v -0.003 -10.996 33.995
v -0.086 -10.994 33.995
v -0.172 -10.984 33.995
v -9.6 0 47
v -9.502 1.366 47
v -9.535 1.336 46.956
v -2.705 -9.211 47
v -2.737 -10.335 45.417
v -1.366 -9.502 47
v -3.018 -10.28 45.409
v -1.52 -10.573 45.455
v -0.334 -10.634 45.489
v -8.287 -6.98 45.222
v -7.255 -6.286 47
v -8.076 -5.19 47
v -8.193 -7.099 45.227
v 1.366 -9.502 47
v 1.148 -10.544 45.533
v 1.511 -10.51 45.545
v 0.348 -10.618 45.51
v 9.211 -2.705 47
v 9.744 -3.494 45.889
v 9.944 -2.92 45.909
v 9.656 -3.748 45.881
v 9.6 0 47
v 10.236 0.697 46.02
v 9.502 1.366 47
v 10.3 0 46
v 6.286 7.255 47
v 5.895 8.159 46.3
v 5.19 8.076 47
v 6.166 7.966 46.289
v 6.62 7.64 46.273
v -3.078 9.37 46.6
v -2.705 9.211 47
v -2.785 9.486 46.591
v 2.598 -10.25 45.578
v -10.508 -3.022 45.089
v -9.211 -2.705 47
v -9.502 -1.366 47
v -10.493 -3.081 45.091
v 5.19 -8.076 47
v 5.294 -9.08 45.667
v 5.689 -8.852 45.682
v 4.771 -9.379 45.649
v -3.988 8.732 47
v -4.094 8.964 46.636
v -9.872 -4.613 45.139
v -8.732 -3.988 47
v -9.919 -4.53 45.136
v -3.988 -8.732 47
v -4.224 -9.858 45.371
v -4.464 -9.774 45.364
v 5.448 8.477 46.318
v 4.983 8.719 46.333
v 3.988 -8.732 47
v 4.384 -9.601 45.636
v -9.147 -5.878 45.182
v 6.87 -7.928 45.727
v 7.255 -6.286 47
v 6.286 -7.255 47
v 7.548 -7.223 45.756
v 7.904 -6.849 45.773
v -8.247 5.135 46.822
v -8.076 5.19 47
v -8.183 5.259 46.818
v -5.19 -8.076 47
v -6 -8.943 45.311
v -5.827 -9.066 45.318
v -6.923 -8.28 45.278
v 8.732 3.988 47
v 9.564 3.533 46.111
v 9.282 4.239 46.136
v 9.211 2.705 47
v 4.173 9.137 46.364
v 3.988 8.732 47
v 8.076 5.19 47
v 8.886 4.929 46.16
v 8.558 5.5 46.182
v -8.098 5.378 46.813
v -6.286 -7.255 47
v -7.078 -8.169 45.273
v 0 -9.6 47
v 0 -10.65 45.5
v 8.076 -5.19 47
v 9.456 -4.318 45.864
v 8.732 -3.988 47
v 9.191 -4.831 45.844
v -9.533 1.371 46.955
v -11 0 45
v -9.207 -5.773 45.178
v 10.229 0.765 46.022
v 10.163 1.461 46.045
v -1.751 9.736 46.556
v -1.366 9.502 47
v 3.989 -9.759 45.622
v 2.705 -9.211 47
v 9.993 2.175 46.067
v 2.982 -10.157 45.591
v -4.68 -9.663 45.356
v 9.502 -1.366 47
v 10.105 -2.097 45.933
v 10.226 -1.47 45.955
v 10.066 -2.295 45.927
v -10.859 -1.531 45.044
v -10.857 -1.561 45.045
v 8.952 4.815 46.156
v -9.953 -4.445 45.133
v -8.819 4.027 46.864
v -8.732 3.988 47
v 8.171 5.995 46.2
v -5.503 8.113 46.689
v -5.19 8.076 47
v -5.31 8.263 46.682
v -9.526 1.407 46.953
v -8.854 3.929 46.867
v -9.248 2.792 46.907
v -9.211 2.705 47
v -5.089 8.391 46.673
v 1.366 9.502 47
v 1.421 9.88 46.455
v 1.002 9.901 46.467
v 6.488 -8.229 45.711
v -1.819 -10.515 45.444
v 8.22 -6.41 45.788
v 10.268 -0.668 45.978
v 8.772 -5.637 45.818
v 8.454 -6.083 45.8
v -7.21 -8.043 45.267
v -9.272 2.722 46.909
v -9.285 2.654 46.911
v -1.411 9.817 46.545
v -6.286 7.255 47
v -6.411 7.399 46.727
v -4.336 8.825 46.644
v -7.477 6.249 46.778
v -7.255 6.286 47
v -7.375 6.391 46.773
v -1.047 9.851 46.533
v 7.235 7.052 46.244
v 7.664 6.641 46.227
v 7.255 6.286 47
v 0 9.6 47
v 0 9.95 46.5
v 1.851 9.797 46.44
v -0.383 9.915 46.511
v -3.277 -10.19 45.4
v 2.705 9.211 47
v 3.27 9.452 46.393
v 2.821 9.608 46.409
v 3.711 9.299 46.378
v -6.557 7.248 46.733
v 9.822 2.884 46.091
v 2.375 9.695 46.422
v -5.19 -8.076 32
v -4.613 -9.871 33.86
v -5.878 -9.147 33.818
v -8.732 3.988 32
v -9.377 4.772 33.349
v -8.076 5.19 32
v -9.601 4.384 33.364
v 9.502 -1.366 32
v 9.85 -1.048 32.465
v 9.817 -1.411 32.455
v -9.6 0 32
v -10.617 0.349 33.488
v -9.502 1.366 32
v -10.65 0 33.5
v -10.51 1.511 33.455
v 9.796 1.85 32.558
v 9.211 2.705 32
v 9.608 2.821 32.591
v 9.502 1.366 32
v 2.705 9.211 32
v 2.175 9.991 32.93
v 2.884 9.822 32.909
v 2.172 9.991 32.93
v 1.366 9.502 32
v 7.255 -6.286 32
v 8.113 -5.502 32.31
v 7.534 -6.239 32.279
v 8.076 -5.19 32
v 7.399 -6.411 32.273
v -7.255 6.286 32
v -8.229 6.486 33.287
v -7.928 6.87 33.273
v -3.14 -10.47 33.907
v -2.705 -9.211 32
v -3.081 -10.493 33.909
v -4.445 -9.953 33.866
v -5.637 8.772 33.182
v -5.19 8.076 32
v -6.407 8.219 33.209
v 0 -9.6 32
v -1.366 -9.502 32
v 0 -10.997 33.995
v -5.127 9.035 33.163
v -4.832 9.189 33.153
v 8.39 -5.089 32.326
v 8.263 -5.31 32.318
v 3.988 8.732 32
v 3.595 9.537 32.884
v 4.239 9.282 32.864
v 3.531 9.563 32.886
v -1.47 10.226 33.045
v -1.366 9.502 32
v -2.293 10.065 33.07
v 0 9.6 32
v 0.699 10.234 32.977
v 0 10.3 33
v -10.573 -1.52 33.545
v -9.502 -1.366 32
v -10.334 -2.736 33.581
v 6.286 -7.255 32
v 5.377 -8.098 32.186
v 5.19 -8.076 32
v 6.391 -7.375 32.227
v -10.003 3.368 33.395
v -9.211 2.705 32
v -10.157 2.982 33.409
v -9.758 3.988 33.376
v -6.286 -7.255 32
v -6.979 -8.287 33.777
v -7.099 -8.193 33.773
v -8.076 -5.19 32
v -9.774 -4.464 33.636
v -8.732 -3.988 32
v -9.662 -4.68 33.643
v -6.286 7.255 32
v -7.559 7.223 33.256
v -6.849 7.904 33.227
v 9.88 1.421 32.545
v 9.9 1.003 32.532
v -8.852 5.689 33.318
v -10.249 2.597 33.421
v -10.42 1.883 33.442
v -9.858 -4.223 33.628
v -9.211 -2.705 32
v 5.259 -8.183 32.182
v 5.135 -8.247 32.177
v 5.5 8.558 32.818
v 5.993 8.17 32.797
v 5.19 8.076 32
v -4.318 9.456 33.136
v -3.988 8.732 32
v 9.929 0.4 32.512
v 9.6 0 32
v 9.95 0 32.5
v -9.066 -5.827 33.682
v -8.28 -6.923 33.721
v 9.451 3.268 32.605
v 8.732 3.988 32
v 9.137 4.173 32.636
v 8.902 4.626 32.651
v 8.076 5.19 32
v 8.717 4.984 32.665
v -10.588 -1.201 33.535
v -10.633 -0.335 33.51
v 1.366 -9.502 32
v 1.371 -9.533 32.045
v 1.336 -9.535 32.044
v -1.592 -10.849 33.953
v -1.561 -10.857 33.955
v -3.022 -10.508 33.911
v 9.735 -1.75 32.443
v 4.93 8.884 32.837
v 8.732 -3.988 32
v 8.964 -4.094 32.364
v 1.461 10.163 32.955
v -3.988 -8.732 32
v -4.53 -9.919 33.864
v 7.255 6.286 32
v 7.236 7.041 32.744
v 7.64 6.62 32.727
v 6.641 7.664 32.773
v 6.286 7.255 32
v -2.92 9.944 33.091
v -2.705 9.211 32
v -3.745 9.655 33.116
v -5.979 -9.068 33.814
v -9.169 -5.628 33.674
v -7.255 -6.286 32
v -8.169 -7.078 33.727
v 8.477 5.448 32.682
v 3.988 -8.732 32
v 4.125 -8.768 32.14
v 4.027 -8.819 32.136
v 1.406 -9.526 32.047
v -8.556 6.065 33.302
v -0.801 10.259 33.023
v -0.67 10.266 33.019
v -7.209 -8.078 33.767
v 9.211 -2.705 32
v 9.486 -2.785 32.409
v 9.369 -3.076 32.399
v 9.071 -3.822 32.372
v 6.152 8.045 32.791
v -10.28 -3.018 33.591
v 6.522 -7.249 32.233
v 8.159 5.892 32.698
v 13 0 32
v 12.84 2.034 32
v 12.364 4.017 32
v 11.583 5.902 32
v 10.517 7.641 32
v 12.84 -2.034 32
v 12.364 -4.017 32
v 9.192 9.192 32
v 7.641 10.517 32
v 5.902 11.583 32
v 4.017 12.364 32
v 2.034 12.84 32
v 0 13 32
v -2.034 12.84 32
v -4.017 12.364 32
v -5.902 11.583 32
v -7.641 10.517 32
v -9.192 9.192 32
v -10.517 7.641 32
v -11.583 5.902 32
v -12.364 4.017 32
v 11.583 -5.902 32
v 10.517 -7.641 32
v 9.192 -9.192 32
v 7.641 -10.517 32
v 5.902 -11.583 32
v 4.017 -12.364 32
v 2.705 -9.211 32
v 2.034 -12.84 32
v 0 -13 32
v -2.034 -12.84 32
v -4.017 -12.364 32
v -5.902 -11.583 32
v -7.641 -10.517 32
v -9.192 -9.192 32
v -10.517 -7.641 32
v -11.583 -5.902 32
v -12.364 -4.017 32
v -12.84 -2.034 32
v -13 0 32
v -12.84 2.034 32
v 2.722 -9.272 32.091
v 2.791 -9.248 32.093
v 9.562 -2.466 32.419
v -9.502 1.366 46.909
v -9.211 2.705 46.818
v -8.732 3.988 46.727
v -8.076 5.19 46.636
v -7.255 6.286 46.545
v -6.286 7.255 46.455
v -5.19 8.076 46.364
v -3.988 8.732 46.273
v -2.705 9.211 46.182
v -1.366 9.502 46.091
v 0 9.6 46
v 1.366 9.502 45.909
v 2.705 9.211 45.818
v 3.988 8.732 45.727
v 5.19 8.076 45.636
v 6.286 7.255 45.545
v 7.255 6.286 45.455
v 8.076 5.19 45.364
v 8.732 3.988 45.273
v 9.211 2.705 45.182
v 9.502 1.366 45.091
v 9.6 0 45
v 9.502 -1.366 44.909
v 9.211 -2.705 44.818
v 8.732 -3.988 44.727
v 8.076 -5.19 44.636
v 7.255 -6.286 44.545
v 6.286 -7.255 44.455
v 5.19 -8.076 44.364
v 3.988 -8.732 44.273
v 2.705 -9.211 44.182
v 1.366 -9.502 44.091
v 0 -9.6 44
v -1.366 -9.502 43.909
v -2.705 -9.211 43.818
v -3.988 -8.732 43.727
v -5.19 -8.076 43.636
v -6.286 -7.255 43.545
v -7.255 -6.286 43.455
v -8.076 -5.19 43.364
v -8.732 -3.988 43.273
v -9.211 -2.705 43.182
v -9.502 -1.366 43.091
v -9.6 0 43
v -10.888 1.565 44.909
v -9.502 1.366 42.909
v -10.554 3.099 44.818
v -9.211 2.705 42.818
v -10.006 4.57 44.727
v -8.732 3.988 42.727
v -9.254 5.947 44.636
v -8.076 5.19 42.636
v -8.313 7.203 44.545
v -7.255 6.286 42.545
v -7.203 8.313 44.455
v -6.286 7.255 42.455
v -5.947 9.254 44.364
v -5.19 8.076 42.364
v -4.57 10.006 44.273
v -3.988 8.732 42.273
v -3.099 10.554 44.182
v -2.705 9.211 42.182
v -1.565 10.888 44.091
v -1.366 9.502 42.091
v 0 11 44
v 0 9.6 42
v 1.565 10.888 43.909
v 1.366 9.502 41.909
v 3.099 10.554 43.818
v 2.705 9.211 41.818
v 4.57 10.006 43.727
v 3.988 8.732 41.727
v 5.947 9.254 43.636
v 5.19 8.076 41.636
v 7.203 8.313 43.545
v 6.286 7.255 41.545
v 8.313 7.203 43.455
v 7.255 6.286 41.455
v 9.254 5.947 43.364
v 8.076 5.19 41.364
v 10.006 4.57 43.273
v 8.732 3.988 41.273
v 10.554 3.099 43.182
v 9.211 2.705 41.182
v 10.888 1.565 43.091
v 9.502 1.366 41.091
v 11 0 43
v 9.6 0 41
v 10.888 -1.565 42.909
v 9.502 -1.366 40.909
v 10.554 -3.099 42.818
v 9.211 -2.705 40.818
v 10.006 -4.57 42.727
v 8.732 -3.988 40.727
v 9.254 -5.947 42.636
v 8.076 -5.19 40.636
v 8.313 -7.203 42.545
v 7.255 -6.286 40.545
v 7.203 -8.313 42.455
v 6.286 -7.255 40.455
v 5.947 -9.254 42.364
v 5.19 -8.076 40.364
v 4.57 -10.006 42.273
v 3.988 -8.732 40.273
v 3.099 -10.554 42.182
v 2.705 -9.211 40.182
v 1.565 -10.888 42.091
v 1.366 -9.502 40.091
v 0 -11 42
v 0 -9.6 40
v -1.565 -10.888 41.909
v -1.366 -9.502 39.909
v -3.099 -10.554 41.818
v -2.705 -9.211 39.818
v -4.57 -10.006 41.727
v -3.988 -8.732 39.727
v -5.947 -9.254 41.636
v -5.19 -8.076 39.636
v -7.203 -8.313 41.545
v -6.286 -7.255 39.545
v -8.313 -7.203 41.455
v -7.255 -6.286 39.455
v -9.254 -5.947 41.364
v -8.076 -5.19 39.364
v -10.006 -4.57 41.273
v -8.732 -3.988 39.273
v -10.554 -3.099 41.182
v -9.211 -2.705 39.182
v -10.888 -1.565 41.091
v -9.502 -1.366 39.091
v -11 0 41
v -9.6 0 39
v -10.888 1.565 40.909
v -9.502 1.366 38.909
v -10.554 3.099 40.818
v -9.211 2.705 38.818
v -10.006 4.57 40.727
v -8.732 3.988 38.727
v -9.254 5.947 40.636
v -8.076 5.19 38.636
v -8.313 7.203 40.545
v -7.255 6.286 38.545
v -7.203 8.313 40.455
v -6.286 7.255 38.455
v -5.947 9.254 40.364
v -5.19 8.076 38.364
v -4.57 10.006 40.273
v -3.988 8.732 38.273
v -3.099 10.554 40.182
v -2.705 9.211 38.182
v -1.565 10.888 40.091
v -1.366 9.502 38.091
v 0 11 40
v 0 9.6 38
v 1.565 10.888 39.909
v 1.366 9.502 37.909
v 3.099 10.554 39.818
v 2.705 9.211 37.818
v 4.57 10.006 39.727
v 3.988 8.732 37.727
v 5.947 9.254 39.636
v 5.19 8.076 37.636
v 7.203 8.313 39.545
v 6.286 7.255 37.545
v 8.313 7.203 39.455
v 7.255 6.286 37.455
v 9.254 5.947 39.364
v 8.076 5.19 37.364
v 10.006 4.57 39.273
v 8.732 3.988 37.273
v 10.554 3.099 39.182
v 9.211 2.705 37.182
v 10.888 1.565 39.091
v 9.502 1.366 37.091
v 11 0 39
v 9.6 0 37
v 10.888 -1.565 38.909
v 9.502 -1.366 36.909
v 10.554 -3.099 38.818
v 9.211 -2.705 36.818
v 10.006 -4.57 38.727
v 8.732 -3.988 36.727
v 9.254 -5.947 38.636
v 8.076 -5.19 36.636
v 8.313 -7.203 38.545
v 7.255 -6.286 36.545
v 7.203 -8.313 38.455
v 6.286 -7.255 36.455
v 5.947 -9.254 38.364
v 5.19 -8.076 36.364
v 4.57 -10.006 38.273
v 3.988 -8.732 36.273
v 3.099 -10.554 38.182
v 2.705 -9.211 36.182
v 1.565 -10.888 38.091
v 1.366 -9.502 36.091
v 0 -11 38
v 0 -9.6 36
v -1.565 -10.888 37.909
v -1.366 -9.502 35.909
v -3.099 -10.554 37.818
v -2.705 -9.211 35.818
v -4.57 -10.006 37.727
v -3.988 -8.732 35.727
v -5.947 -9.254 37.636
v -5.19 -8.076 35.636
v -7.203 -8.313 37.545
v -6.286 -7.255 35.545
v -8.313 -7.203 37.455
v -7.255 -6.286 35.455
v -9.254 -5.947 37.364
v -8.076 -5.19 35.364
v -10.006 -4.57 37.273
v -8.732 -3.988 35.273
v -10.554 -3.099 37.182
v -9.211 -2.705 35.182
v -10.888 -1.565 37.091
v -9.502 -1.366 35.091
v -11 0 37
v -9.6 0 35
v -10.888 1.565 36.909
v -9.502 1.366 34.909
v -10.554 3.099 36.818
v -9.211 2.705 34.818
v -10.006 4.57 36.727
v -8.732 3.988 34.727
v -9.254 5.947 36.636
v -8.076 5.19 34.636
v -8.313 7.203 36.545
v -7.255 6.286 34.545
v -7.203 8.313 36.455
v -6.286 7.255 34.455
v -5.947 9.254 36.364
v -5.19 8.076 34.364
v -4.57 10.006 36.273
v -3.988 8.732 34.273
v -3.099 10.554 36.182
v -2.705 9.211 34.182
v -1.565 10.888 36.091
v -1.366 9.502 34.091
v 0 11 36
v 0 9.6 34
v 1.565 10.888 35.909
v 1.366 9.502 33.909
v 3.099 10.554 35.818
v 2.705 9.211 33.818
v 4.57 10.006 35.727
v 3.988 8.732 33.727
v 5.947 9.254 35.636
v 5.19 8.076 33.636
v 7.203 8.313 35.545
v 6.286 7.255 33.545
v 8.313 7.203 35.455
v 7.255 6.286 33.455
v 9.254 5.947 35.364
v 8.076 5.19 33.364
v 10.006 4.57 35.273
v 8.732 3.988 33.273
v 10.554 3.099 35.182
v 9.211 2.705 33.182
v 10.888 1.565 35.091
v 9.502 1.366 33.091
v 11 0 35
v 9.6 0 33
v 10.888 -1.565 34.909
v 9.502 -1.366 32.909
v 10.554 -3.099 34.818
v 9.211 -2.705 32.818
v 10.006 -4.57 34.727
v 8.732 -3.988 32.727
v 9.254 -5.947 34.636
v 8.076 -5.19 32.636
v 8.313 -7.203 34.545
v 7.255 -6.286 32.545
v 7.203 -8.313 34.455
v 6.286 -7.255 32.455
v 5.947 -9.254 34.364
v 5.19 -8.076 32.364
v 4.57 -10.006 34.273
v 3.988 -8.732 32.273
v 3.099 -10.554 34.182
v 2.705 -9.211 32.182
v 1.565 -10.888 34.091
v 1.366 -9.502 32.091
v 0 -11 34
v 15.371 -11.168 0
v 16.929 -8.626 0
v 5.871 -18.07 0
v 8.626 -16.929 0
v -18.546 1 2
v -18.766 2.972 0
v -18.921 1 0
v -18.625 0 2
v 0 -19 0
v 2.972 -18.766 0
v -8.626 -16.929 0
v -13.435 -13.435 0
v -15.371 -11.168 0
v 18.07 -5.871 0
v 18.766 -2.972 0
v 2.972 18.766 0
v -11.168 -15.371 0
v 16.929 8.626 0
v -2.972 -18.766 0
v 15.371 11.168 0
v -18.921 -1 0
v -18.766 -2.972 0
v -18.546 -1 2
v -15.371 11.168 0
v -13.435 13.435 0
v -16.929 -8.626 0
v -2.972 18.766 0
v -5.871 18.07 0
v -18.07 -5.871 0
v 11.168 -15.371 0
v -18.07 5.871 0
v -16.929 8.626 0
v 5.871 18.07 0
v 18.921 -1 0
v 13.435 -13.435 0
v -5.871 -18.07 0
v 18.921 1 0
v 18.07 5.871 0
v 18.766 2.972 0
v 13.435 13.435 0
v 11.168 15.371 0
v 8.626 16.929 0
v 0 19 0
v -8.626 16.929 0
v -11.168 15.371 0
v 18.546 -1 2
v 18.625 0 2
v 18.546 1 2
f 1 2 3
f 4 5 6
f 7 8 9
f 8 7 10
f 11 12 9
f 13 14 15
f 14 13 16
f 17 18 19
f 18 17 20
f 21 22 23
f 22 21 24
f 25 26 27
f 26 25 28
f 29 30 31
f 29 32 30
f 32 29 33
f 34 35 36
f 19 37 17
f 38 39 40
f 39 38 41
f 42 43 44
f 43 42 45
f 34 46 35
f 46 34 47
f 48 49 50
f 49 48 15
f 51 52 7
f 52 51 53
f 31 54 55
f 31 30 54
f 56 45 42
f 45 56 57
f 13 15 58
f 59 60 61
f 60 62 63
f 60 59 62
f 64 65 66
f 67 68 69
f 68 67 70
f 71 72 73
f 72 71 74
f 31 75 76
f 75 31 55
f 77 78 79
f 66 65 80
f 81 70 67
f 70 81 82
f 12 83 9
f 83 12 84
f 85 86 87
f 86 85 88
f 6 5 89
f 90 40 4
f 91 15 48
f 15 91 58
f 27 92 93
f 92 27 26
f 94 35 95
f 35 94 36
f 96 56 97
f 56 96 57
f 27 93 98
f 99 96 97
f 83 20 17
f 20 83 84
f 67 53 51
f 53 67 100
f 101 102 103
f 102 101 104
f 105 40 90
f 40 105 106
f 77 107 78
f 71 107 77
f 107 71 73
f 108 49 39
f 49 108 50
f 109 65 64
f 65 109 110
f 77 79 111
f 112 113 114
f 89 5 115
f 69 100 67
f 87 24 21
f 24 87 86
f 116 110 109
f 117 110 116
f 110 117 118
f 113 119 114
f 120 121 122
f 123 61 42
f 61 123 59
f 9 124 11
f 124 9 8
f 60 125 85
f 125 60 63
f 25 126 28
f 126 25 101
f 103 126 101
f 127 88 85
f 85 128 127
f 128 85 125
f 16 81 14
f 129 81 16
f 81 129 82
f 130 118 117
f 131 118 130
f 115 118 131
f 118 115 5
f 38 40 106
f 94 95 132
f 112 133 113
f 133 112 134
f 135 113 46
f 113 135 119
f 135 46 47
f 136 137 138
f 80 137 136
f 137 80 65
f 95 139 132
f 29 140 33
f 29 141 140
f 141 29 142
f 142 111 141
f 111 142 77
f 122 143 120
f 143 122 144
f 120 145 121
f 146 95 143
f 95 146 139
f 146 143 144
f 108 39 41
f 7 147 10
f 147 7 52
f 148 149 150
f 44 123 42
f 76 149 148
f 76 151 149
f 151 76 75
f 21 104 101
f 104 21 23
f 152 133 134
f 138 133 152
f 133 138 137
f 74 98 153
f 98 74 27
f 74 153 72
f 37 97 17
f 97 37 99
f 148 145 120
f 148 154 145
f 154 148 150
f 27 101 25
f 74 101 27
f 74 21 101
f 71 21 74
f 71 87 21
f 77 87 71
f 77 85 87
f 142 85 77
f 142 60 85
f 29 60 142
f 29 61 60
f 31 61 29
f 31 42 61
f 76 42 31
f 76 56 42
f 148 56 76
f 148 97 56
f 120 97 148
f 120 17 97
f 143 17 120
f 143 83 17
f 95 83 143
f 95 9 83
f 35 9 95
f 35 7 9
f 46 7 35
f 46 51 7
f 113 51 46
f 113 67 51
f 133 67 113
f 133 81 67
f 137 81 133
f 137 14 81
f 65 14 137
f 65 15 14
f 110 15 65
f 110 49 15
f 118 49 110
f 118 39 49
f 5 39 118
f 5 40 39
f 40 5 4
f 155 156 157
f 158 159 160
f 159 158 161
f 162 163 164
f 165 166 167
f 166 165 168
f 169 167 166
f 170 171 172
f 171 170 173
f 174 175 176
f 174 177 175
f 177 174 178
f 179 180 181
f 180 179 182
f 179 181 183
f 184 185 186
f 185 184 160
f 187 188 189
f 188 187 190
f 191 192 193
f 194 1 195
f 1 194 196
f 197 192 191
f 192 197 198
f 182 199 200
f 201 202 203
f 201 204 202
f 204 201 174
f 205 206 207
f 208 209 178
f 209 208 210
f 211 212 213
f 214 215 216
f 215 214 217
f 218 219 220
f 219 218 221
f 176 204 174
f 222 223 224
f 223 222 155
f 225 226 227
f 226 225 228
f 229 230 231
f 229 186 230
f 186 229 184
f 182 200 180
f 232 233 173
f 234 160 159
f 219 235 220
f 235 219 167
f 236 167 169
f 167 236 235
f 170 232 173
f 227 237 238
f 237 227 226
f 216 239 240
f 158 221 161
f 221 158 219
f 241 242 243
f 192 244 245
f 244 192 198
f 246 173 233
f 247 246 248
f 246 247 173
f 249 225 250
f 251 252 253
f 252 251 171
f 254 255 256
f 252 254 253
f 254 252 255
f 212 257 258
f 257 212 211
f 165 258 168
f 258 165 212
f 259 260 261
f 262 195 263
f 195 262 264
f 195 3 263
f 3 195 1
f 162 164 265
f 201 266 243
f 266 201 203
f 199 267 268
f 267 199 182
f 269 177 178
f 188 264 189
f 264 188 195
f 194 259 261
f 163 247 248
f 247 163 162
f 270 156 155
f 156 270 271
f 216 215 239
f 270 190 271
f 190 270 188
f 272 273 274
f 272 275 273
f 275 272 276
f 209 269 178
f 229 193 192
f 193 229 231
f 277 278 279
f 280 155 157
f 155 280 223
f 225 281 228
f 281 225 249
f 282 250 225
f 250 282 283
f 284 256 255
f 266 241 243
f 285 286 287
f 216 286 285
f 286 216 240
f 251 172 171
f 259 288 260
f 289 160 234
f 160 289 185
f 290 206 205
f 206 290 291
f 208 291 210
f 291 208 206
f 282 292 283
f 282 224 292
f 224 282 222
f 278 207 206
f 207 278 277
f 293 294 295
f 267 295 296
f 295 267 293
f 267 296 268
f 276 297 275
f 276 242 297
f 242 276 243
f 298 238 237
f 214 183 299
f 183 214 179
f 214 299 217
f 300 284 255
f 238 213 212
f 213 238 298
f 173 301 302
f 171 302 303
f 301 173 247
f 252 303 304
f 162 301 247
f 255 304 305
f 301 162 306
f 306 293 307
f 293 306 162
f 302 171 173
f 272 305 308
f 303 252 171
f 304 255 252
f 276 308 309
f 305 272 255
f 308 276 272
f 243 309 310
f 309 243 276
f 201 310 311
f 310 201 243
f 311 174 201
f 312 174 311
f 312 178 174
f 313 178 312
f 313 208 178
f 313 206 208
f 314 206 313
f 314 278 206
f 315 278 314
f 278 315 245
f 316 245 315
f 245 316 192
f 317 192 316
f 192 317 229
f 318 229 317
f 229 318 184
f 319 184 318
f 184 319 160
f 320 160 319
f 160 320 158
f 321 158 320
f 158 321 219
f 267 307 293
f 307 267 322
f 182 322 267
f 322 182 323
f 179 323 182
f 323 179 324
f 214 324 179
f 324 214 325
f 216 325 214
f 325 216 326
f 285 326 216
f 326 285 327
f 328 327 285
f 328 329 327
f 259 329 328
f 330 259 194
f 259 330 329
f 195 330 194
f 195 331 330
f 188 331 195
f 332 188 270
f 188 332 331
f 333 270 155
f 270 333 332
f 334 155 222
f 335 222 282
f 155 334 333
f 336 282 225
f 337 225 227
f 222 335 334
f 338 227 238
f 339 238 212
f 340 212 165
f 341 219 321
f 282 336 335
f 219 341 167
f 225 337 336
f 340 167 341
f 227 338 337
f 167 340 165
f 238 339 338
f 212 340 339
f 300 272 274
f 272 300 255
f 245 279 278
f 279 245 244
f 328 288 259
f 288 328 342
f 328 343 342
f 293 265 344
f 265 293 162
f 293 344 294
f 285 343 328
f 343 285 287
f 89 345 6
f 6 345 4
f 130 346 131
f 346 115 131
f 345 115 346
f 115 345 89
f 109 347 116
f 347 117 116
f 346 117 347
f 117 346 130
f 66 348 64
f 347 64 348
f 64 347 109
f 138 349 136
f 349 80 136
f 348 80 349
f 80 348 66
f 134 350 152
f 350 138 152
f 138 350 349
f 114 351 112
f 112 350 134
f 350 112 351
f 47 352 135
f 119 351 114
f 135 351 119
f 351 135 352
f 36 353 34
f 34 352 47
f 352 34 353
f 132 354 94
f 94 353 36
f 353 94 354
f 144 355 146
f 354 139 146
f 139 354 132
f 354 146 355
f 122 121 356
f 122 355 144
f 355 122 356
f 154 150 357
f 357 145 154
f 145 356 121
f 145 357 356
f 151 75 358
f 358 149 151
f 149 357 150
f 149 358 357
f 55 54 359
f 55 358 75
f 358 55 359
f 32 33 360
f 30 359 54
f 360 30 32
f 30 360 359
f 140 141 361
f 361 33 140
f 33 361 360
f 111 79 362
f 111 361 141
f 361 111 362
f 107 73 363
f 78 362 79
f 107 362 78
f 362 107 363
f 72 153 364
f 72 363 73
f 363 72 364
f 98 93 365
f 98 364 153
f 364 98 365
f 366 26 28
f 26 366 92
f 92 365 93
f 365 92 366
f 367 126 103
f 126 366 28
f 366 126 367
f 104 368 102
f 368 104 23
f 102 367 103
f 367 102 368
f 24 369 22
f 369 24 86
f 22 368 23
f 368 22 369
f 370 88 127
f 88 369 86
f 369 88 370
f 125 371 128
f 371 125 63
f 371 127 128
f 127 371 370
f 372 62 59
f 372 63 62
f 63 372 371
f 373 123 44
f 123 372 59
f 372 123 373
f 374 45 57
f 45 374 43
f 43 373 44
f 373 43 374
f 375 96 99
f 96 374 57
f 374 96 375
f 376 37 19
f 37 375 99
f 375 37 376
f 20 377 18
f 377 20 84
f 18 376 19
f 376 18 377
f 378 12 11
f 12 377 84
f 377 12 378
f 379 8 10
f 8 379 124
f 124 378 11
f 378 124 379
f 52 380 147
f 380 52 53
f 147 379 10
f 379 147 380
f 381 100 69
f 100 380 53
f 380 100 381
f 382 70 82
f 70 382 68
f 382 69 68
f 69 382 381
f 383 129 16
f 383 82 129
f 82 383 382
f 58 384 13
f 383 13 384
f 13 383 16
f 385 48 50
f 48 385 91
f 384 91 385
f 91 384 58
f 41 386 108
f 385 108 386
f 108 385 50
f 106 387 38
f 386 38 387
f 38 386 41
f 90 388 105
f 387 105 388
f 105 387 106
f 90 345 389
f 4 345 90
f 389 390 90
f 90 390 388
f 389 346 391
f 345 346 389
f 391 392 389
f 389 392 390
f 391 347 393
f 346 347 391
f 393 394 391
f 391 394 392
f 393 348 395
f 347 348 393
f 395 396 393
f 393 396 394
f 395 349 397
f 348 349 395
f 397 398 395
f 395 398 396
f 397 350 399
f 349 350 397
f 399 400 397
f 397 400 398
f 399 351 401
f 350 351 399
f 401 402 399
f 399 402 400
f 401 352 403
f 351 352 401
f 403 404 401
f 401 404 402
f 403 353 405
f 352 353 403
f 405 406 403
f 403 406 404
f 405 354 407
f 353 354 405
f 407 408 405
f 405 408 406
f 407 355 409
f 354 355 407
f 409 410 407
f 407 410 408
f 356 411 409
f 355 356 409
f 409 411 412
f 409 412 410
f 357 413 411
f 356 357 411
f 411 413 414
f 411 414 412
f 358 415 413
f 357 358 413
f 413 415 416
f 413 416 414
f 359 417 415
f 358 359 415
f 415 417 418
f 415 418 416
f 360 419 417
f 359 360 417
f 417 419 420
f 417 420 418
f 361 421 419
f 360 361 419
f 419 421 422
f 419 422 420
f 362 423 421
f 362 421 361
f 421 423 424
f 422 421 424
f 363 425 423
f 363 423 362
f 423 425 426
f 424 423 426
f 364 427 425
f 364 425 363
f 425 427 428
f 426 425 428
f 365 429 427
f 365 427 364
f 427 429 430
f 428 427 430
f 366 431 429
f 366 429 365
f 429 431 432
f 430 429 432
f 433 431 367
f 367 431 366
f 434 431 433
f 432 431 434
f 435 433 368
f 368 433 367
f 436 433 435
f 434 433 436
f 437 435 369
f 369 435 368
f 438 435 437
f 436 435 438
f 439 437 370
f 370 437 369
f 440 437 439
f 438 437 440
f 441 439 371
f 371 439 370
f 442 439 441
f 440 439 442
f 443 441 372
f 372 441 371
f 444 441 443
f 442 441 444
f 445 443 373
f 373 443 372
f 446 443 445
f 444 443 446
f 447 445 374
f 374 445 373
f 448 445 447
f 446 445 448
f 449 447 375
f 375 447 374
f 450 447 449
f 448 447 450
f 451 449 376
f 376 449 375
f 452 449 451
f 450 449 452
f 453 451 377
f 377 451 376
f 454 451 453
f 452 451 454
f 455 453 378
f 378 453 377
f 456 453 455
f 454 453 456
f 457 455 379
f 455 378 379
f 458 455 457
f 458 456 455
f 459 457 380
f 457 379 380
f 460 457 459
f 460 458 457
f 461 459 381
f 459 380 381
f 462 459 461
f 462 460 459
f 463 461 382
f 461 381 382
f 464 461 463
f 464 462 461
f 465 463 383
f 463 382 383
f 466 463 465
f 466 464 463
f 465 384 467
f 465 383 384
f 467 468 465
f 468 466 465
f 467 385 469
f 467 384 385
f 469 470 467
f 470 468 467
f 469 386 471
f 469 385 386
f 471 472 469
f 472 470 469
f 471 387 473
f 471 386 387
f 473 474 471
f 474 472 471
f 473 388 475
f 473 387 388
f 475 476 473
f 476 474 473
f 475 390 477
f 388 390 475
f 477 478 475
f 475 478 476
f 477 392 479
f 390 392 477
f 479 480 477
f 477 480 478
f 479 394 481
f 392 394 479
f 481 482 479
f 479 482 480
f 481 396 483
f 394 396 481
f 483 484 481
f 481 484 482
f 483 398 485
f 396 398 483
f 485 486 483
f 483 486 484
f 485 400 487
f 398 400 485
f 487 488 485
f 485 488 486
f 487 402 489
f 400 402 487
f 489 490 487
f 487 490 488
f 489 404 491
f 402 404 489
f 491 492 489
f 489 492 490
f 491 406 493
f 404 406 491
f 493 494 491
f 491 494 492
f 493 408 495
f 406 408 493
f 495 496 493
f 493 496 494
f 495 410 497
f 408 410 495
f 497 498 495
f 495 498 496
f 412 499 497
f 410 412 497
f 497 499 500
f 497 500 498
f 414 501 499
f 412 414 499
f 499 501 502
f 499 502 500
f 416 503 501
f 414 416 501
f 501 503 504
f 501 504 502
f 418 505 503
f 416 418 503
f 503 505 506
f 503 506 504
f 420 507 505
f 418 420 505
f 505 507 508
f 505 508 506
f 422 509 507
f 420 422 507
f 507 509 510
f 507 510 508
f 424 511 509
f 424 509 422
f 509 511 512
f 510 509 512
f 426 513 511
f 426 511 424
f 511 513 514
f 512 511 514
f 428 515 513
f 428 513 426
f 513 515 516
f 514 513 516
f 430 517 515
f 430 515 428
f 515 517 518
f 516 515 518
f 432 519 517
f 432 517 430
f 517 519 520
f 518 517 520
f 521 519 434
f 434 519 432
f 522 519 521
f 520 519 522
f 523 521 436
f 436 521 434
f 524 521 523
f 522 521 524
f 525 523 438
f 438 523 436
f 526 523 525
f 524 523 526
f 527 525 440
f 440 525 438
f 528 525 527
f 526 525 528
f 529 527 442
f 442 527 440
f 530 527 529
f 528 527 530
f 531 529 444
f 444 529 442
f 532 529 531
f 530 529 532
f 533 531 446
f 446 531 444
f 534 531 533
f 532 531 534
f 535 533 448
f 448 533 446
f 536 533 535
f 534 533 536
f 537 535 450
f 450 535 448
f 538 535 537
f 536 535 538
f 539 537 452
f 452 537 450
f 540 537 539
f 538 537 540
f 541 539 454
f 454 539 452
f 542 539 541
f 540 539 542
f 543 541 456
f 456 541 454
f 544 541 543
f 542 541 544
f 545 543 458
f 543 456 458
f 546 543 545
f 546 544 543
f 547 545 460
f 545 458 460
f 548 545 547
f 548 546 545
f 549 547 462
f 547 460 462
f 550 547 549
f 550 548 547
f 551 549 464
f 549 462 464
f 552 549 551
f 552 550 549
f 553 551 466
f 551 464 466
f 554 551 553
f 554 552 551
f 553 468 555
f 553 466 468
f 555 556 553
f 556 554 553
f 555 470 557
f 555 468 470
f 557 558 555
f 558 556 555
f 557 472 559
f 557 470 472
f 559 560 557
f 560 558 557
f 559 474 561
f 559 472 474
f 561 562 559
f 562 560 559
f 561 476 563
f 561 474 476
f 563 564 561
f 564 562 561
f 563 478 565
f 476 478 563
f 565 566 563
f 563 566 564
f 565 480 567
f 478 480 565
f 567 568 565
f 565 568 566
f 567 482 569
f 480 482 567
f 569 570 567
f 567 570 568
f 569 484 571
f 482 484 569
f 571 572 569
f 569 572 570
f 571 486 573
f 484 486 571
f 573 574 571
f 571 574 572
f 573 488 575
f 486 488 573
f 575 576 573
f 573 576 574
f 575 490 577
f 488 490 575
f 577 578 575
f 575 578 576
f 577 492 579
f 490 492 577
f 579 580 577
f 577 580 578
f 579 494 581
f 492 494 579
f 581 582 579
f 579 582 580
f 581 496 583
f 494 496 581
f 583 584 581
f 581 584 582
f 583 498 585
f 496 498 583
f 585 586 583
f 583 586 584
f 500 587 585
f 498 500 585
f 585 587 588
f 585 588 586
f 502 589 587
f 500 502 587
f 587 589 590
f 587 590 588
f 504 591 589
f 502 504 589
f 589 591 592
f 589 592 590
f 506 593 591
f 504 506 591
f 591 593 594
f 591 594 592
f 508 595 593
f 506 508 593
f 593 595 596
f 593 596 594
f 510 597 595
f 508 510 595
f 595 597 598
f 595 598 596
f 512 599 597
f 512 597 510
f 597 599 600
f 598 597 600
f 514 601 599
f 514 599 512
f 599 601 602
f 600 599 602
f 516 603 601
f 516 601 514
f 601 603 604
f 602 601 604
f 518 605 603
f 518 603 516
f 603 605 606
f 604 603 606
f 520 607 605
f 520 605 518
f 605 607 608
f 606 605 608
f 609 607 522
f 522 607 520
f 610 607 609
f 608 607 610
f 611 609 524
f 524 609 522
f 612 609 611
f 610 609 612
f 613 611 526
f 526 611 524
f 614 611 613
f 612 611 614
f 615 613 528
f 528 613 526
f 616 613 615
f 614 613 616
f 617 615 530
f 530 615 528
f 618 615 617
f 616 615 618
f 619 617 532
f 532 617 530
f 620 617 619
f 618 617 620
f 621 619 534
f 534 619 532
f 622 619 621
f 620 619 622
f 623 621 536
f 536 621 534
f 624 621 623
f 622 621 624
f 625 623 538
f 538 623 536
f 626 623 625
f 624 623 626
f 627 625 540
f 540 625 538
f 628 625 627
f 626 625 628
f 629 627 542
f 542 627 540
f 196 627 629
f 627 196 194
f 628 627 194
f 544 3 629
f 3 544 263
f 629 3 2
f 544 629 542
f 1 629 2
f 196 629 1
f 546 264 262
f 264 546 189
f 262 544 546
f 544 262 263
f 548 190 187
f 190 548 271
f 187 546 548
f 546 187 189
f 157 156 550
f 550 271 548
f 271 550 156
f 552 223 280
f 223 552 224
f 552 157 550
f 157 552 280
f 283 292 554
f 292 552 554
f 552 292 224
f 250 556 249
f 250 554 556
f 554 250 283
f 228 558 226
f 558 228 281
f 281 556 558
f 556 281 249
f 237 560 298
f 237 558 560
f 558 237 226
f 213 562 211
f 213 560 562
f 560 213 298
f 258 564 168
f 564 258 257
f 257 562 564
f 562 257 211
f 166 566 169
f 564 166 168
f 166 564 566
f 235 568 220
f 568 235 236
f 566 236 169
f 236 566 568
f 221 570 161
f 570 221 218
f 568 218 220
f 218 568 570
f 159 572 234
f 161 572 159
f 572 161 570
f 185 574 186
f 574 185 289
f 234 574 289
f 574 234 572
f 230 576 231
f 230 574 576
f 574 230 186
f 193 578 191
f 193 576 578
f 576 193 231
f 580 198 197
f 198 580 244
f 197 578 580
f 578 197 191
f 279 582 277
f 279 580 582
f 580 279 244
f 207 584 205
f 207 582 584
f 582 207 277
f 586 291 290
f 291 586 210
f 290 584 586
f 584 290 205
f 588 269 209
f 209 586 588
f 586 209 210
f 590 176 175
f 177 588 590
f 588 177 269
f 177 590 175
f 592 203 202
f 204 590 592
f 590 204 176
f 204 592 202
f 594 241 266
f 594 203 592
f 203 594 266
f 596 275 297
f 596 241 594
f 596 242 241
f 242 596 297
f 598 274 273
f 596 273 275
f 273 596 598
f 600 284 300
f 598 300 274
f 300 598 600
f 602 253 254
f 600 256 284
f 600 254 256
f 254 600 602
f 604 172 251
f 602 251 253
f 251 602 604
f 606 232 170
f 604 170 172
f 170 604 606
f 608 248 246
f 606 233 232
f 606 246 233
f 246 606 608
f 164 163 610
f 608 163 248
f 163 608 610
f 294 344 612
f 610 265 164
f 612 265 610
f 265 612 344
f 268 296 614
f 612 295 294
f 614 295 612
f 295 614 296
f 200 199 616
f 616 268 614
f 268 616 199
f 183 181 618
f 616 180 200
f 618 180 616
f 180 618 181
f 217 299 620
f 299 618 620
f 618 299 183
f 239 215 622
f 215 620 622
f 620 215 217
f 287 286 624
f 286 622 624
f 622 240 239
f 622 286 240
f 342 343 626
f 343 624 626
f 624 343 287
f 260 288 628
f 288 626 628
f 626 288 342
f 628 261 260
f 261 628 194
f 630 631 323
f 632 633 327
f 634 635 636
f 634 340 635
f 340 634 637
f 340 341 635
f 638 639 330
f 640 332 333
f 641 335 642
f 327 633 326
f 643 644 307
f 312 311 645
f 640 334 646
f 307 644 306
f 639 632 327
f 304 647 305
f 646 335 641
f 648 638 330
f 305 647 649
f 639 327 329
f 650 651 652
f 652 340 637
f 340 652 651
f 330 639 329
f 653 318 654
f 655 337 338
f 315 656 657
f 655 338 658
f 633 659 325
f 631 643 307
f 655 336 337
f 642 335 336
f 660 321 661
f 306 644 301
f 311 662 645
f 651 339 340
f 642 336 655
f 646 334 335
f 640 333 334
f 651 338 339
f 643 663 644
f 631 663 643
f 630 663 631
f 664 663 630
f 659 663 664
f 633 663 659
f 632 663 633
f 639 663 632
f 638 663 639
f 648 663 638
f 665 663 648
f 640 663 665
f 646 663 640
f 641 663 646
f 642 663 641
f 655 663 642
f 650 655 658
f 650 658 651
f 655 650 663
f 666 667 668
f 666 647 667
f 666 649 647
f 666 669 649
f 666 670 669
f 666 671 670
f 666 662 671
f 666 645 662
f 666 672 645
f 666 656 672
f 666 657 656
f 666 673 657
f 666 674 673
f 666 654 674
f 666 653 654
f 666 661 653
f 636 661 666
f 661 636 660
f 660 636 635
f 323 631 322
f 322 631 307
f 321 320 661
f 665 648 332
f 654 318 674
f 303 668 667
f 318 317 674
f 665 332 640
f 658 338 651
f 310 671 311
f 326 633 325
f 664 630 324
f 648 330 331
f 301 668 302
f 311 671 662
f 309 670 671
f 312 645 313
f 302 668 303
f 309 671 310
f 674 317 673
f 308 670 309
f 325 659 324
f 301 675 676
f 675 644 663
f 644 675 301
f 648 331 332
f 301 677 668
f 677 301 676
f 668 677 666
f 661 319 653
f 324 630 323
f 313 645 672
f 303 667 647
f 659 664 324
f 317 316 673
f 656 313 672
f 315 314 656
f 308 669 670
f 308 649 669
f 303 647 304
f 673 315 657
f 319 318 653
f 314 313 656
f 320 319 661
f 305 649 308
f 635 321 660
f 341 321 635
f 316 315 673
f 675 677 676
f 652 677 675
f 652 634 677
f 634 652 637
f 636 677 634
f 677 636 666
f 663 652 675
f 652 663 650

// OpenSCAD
//////////////////////////////////////////////////////////////////////
// Project: Custom Threaded scupper plugs for Pelican kayak         //
// Purpose: Stop me from getting a wet butt.                        //
// Add attachements in the future.                                  //
// Author: infinigrove Squirrel Master                              //
// Date: 23 December 2015    v1.3                                   //
//////////////////////////////////////////////////////////////////////

// Printing:
// Set to 10% to 20% infill with minimal material so they float!

// ---------------------------------------------------------------- //
// ------------------ BEGIN USER SERVICABLE CODE ------------------ //
// ---------------------------------------------------------------- //

//   !!!! NOTE: DIMENSIONS ARE METRIC AND IN MILIMETERS !!!!   //

// Length of scupper plug
plug_length = 32;

plug_detail = 40; //[40:360]

thread_detail = 2; //[2:8]

// Diameter of the top of plug
top_diameter = 26;

top_style = "bolt"; //[bolt,nut,hook,flat,pole_holder]

top_base_bevel = "no"; //[yes,no]

top_thread_length = 15;
top_thread_diameter = 22;
top_thread_pitch = 4; //[2:6]

// Diameter of bottom of plug
bottom_diameter = 38;

// Which end would you like? (bottom)
bottom_style = "slot"; //[slot,bolt,nut,hook,gopro,flat,scoop]

bottom_base_bevel = "no"; //[yes,no]

/* [bottom slot] */

slot_size = 2; // [1:10]

/* [bottom bolt nut] */

bottom_thread_length = 47;
bottom_thread_diameter = 18;
bottom_thread_pitch = 4; //[2:6]

/* [Top Pole Holder EXPERIMENTAL] */

pole_holder_length = 115;
pole_holder_outer_diameter = 40;
pole_holder_inner_diameter = 28;
pole_holder_base_diameter = 80;

/* [GoPro Connector EXPERIMENTAL] */

gopro_style="triple_nut"; // [triple_nut,triple,double]
gopro_base_height = 48;


/* [Hidden] */

// The gopro connector itself (you most probably do not want to change this but for the first two)

// The locking nut on the gopro mount triple arm mount (keep it tight)
gopro_nut_d= 9.2;
// How deep is this nut embossing (keep it small to avoid over-overhangs)
gopro_nut_h= 2;
// Hole diameter for the two-arm mount part
gopro_holed_two= 5;
// Hole diameter for the three-arm mount part
gopro_holed_three= 5.5;
// Thickness of the internal arm in the 3-arm mount part
gopro_connector_th3_middle= 3.1;
// Thickness of the side arms in the 3-arm mount part
gopro_connector_th3_side= 2.7;
// Thickness of the arms in the 2-arm mount part
gopro_connector_th2= 3.04;
// The gap in the 3-arm mount part for the two-arm
gopro_connector_gap= 3.1;
// How round are the 2 and 3-arm parts
gopro_connector_roundness= 1;
// How thick are the mount walls
gopro_wall_th= 3;

gopro_connector_wall_tol=1.1+0;
gopro_tol=0.04+0;

// Can be queried from the outside
gopro_connector_z= 2*gopro_connector_th3_side+gopro_connector_th3_middle+2*gopro_connector_gap;
gopro_connector_x= gopro_connector_z;
gopro_connector_y= gopro_connector_z/2+gopro_wall_th;
// ---------------------------------------------------------------- //
// ------------------- END USER SERVICABLE CODE ------------------- //
module plug_torus(r,rnd)
{
	translate([0,0,rnd/2])
		rotate_extrude(convexity= 10, $fn=plug_detail)
			translate([r-rnd/2, 0, 0])
				circle(r= rnd/2, $fs=0.2);
}
// ---------------------------------------------------------------- //
// --- screw thread modules --------------------------------------- //
/*    Minimal thread modules hacked from
 *    polyScrewThread.scad    by aubenc @ Thingiverse
 *
 * This script contains the library modules that can be used to 
 * generate screw and nut threads.
 *
 * http://www.thingiverse.com/thing:8796
 *
 * CC Public Domain
 */
// --- modules added for use with thingverse cusomizer ------------ //
// ---------------------------------------------------------------- //
module screw_thread(od,st,lf0,lt,rs,cs)
{
    or=od/2;
    ir=or-st/2*cos(lf0)/sin(lf0);
    pf=2*PI*or;
    sn=floor(pf/rs);
    lfxy=360/sn;
    ttn=round(lt/st)+1;
    zt=st/sn;

    intersection()
    {
        if (cs >= -1)
        {
           # thread_shape(cs,lt,or,ir,sn,st);
        }

        full_thread(ttn,st,sn,zt,lfxy,or,ir);
    }
}

module thread_shape(cs,lt,or,ir,sn,st)
{
    if ( cs == 0 )
    {
        cylinder(h=lt, r=or, $fn=sn, center=false);
    }
    else
    {
        union()
        {
            translate([0,0,st/2])
              cylinder(h=lt-st+0.005, r=or, $fn=sn, center=false);

            if ( cs == -1 || cs == 2 )
            {
                cylinder(h=st/2, r1=ir, r2=or, $fn=sn, center=false);
            }
            else
            {
                cylinder(h=st/2, r=or, $fn=sn, center=false);
            }

            translate([0,0,lt-st/2])
            if ( cs == 1 || cs == 2 )
            {
                  cylinder(h=st/2, r1=or, r2=ir, $fn=sn, center=false);
            }
            else
            {
                cylinder(h=st/2, r=or, $fn=sn, center=false);
            }
        }
    }
}

module full_thread(ttn,st,sn,zt,lfxy,or,ir)
{
    for(i=[0:ttn-1])
    {
        for(j=[0:sn-1])
        {
            polyhedron(
                  points=[
                          [0,                  0,                  i*st-st            ],
                          [ir*cos((j+1)*lfxy), ir*sin((j+1)*lfxy), i*st+(j+1)*zt-st   ],
                          [ir*cos(j*lfxy),     ir*sin(j*lfxy),     i*st+j*zt-st       ],
                          [or*cos((j+1)*lfxy), or*sin((j+1)*lfxy), i*st+(j+1)*zt-st/2 ],
                          [or*cos(j*lfxy),     or*sin(j*lfxy),     i*st+j*zt-st/2     ],
                          [0,                  0,                  i*st+st            ],
                          [ir*cos((j+1)*lfxy), ir*sin((j+1)*lfxy), i*st+(j+1)*zt      ],
                          [ir*cos(j*lfxy),     ir*sin(j*lfxy),     i*st+j*zt          ]
                         ],
               triangles=[
                          [0,1,2],
                          [5,6,3],[5,3,0],[0,3,1],
                          [3,4,1],[1,4,2],
                          [3,6,4],[4,6,7],
                          [0,2,4],[0,4,5],[5,4,7],
                          [5,7,6]
                         ],
               convexity=5);
        }
    }
}
//GoPro connector module hacked from
// gopro_mounts_mooncactus.scad by MoonCactus
// http://www.thingiverse.com/thing:62800
module gopro_torus(r,rnd)
{
	translate([0,0,rnd/2])
		rotate_extrude(convexity= 10, $fn=plug_detail/2)
			translate([r-rnd/2, 0, 0])
				circle(r= rnd/2, $fs=0.2);
}


module gopro_connector(version="double", withnut=true, captive_nut_th=0, captive_nut_od=0, captive_rod_id=0, captive_nut_angle=0)
{
	module gopro_profile(th)
	{
		hull()
		{
			gopro_torus(r=gopro_connector_z/2, rnd=gopro_connector_roundness);
			translate([0,0,th-gopro_connector_roundness])
				gopro_torus(r=gopro_connector_z/2, rnd=gopro_connector_roundness);
			translate([-gopro_connector_z/2,gopro_connector_z/2,0])
				cube([gopro_connector_z,gopro_wall_th,th]);
		}
	}
	difference()
	{
		union()
		{
			if(version=="double")
			{
				for(mz=[-1:2:+1]) scale([1,1,mz])
						translate([0,0,gopro_connector_th3_middle/2 + (gopro_connector_gap-gopro_connector_th2)/2]) gopro_profile(gopro_connector_th2);
			}
			if(version=="triple")
			{
				translate([0,0,-gopro_connector_th3_middle/2]) gopro_profile(gopro_connector_th3_middle);
				for(mz=[-1:2:+1]) scale([1,1,mz])
					translate([0,0,gopro_connector_th3_middle/2 + gopro_connector_gap]) gopro_profile(gopro_connector_th3_side);
			}

			// add the common wall
			//translate([0,gopro_connector_z/2+gopro_wall_th/2+gopro_connector_wall_tol,0])
				//cube([gopro_connector_z,gopro_wall_th,gopro_connector_z], center=true);
            translate([0,(gopro_connector_z/2+gopro_wall_th/2+gopro_connector_wall_tol)+gopro_base_height,0]) rotate([90,0,0]) cylinder(h=gopro_base_height,d1=bottom_diameter,d2=gopro_connector_z*1.5,$fn=plug_detail);

			// add the optional nut emboss
			if(version=="triple" && withnut)
			{
				translate([0,0,gopro_connector_z/2-gopro_tol])
				difference()
				{
					cylinder(r1=gopro_connector_z/2-gopro_connector_roundness/2, r2=11.5/2, h=gopro_nut_h+gopro_tol, $fn=plug_detail /2);
					cylinder(r=gopro_nut_d/2, h=gopro_connector_z/2+3.5+gopro_tol, $fn=6);
				}
			}
		}
		// remove the axis
		translate([0,0,-gopro_tol])
			cylinder(r=(version=="double" ? gopro_holed_two : gopro_holed_three)/2, h=gopro_connector_z+4*gopro_tol, center=true, $fn=plug_detail /2);
	}
}

// ---------------------------------------------------------------- //
// --- render a custom threaded scupper plug ---------------------- //
// ---             MAIN CODE                 ---------------------- //
// ---------------------------------------------------------------- //
/*    Partially hacked and major additions from
 *    Glide_Kayak_Scuppers_-_Mahi_rev2.scad    by Max Bainrot 
 *
 * http://www.thingiverse.com/thing:951903
 *
 */
// ---------------------------------------------------------------- //
// ------- can be thanked for hook scupper end -------------------- //
// ---------------------------------------------------------------- //
PI=3.141592;
translate([0,0,plug_length])
rotate([0,180,0])
difference()
{
    union()
    {
        cylinder(h=(plug_length), r1=(top_diameter/2), r2=(bottom_diameter /2),$fn=plug_detail);
        
        // GoPro connector
        if (bottom_style == "gopro") 
        {
            if (gopro_style == "double") translate([0,0,plug_length+10+gopro_base_height])  rotate([270,0,0]) gopro_connector("double");
            if (gopro_style == "triple") translate([0,0,plug_length+10+gopro_base_height])  rotate([270,0,0]) gopro_connector("triple", withnut=false);
            if (gopro_style == "triple_nut") translate([0,0,plug_length+10+gopro_base_height])  rotate([270,0,0]) gopro_connector("triple", withnut=true);
        }  
        // scoop connector
        if (bottom_style == "scoop") translate([0,0,plug_length]) sphere(d=bottom_diameter, $fn=plug_detail);;
        
        // pole holder base
        if (top_style == "pole_holder") translate([0,0,-(pole_holder_outer_diameter /3)]) cylinder( h=pole_holder_outer_diameter /3,   d1=pole_holder_outer_diameter,    d2=pole_holder_base_diameter, $fn=plug_detail);
        
        if (top_style == "bolt") translate([0,0,-(top_thread_length)]) screw_thread(top_thread_diameter,top_thread_pitch,55,top_thread_length,PI/thread_detail,2);
            
        if (bottom_style == "bolt") translate([0,0,plug_length]) screw_thread(bottom_thread_diameter,bottom_thread_pitch,55,bottom_thread_length,PI/thread_detail,2);
            
        if (top_style == "hook") translate([0,(top_diameter /8),0]) rotate([90,0,0]) cylinder(d=top_diameter - 3,h=top_diameter /4,$fn=plug_detail);
        
        if (bottom_style == "hook") translate([0,(bottom_diameter /8),plug_length]) rotate([90,0,0]) cylinder(d=bottom_diameter - 3,h=bottom_diameter /4,$fn=plug_detail);
            
        if (bottom_base_bevel == "yes") translate([0,0,plug_length-(gopro_connector_roundness/1.4)]) plug_torus(r=bottom_diameter/2, rnd=gopro_connector_roundness);
            
        if (top_base_bevel == "yes") translate([0,0,-(gopro_connector_roundness/1.4)]) plug_torus(r=top_diameter/2, rnd=gopro_connector_roundness);
            
    }
    if (top_style == "hook") translate([0,0,0]) sphere(d=top_diameter /1.5, $fn=plug_detail);
        
    if (bottom_style == "hook") translate([0,0,plug_length]) sphere(d=bottom_diameter /1.5, $fn=plug_detail);
    
    if (top_style == "nut") screw_thread(top_thread_diameter,top_thread_pitch,55,top_thread_length,PI/thread_detail,0);
        
    if (bottom_style == "nut") translate([0,0,(plug_length - bottom_thread_length)]) screw_thread(bottom_thread_diameter,bottom_thread_pitch,55,bottom_thread_length,PI/thread_detail,0);
    
    if (bottom_style == "slot") translate([-(bottom_diameter /2),-(slot_size /2),(plug_length - slot_size)]) cube([bottom_diameter,slot_size,slot_size+gopro_connector_roundness]);
        
    
        
    if (bottom_style == "scoop") translate([0,0,plug_length]) 
    {
        //remove half with block and scoop out whats left
        translate([-(bottom_diameter /2), 0, 0])cube([bottom_diameter,bottom_diameter,bottom_diameter]);
        sphere(d=bottom_diameter - 4, $fn=plug_detail);
        //remove cylinder in plug
        translate([0,0,-plug_length]) cylinder(h=plug_length, d1=(top_diameter - 4), d2=(bottom_diameter - 4), $fn=plug_detail);
        
        //remove cylinder in top_bolt
        translate([0,0,-(plug_length + top_thread_length)]) cylinder(h=top_thread_length, d1=(top_thread_diameter - top_thread_pitch), d2=(top_thread_diameter - top_thread_pitch), $fn=plug_detail);
        
        //translate([0,0,-(plug_length + top_thread_length)]) cylinder(h=(plug_length + top_thread_length), d1=(bottom_thread_diameter - bottom_thread_pitch), d2=(bottom_diameter - 4), $fn=plug_detail);
        
    }
}

// pole holder main cylinder
if (top_style == "pole_holder") 
{
    // you may need to tweek this traslate depending on size of pole holder
    translate([(pole_holder_outer_diameter/1.1),0,(plug_length + pole_holder_length)*.98]) 
    rotate([0,200,0])
    difference()
    {
        union()
        {
            // pole holder outer
            cylinder(h=pole_holder_length, d=pole_holder_outer_diameter,$fn=plug_detail);
    
        }
        
        // pole holder inner
        cylinder(h=(pole_holder_length - (pole_holder_outer_diameter - pole_holder_inner_diameter)), d=pole_holder_inner_diameter,$fn=plug_detail);
    }
}
